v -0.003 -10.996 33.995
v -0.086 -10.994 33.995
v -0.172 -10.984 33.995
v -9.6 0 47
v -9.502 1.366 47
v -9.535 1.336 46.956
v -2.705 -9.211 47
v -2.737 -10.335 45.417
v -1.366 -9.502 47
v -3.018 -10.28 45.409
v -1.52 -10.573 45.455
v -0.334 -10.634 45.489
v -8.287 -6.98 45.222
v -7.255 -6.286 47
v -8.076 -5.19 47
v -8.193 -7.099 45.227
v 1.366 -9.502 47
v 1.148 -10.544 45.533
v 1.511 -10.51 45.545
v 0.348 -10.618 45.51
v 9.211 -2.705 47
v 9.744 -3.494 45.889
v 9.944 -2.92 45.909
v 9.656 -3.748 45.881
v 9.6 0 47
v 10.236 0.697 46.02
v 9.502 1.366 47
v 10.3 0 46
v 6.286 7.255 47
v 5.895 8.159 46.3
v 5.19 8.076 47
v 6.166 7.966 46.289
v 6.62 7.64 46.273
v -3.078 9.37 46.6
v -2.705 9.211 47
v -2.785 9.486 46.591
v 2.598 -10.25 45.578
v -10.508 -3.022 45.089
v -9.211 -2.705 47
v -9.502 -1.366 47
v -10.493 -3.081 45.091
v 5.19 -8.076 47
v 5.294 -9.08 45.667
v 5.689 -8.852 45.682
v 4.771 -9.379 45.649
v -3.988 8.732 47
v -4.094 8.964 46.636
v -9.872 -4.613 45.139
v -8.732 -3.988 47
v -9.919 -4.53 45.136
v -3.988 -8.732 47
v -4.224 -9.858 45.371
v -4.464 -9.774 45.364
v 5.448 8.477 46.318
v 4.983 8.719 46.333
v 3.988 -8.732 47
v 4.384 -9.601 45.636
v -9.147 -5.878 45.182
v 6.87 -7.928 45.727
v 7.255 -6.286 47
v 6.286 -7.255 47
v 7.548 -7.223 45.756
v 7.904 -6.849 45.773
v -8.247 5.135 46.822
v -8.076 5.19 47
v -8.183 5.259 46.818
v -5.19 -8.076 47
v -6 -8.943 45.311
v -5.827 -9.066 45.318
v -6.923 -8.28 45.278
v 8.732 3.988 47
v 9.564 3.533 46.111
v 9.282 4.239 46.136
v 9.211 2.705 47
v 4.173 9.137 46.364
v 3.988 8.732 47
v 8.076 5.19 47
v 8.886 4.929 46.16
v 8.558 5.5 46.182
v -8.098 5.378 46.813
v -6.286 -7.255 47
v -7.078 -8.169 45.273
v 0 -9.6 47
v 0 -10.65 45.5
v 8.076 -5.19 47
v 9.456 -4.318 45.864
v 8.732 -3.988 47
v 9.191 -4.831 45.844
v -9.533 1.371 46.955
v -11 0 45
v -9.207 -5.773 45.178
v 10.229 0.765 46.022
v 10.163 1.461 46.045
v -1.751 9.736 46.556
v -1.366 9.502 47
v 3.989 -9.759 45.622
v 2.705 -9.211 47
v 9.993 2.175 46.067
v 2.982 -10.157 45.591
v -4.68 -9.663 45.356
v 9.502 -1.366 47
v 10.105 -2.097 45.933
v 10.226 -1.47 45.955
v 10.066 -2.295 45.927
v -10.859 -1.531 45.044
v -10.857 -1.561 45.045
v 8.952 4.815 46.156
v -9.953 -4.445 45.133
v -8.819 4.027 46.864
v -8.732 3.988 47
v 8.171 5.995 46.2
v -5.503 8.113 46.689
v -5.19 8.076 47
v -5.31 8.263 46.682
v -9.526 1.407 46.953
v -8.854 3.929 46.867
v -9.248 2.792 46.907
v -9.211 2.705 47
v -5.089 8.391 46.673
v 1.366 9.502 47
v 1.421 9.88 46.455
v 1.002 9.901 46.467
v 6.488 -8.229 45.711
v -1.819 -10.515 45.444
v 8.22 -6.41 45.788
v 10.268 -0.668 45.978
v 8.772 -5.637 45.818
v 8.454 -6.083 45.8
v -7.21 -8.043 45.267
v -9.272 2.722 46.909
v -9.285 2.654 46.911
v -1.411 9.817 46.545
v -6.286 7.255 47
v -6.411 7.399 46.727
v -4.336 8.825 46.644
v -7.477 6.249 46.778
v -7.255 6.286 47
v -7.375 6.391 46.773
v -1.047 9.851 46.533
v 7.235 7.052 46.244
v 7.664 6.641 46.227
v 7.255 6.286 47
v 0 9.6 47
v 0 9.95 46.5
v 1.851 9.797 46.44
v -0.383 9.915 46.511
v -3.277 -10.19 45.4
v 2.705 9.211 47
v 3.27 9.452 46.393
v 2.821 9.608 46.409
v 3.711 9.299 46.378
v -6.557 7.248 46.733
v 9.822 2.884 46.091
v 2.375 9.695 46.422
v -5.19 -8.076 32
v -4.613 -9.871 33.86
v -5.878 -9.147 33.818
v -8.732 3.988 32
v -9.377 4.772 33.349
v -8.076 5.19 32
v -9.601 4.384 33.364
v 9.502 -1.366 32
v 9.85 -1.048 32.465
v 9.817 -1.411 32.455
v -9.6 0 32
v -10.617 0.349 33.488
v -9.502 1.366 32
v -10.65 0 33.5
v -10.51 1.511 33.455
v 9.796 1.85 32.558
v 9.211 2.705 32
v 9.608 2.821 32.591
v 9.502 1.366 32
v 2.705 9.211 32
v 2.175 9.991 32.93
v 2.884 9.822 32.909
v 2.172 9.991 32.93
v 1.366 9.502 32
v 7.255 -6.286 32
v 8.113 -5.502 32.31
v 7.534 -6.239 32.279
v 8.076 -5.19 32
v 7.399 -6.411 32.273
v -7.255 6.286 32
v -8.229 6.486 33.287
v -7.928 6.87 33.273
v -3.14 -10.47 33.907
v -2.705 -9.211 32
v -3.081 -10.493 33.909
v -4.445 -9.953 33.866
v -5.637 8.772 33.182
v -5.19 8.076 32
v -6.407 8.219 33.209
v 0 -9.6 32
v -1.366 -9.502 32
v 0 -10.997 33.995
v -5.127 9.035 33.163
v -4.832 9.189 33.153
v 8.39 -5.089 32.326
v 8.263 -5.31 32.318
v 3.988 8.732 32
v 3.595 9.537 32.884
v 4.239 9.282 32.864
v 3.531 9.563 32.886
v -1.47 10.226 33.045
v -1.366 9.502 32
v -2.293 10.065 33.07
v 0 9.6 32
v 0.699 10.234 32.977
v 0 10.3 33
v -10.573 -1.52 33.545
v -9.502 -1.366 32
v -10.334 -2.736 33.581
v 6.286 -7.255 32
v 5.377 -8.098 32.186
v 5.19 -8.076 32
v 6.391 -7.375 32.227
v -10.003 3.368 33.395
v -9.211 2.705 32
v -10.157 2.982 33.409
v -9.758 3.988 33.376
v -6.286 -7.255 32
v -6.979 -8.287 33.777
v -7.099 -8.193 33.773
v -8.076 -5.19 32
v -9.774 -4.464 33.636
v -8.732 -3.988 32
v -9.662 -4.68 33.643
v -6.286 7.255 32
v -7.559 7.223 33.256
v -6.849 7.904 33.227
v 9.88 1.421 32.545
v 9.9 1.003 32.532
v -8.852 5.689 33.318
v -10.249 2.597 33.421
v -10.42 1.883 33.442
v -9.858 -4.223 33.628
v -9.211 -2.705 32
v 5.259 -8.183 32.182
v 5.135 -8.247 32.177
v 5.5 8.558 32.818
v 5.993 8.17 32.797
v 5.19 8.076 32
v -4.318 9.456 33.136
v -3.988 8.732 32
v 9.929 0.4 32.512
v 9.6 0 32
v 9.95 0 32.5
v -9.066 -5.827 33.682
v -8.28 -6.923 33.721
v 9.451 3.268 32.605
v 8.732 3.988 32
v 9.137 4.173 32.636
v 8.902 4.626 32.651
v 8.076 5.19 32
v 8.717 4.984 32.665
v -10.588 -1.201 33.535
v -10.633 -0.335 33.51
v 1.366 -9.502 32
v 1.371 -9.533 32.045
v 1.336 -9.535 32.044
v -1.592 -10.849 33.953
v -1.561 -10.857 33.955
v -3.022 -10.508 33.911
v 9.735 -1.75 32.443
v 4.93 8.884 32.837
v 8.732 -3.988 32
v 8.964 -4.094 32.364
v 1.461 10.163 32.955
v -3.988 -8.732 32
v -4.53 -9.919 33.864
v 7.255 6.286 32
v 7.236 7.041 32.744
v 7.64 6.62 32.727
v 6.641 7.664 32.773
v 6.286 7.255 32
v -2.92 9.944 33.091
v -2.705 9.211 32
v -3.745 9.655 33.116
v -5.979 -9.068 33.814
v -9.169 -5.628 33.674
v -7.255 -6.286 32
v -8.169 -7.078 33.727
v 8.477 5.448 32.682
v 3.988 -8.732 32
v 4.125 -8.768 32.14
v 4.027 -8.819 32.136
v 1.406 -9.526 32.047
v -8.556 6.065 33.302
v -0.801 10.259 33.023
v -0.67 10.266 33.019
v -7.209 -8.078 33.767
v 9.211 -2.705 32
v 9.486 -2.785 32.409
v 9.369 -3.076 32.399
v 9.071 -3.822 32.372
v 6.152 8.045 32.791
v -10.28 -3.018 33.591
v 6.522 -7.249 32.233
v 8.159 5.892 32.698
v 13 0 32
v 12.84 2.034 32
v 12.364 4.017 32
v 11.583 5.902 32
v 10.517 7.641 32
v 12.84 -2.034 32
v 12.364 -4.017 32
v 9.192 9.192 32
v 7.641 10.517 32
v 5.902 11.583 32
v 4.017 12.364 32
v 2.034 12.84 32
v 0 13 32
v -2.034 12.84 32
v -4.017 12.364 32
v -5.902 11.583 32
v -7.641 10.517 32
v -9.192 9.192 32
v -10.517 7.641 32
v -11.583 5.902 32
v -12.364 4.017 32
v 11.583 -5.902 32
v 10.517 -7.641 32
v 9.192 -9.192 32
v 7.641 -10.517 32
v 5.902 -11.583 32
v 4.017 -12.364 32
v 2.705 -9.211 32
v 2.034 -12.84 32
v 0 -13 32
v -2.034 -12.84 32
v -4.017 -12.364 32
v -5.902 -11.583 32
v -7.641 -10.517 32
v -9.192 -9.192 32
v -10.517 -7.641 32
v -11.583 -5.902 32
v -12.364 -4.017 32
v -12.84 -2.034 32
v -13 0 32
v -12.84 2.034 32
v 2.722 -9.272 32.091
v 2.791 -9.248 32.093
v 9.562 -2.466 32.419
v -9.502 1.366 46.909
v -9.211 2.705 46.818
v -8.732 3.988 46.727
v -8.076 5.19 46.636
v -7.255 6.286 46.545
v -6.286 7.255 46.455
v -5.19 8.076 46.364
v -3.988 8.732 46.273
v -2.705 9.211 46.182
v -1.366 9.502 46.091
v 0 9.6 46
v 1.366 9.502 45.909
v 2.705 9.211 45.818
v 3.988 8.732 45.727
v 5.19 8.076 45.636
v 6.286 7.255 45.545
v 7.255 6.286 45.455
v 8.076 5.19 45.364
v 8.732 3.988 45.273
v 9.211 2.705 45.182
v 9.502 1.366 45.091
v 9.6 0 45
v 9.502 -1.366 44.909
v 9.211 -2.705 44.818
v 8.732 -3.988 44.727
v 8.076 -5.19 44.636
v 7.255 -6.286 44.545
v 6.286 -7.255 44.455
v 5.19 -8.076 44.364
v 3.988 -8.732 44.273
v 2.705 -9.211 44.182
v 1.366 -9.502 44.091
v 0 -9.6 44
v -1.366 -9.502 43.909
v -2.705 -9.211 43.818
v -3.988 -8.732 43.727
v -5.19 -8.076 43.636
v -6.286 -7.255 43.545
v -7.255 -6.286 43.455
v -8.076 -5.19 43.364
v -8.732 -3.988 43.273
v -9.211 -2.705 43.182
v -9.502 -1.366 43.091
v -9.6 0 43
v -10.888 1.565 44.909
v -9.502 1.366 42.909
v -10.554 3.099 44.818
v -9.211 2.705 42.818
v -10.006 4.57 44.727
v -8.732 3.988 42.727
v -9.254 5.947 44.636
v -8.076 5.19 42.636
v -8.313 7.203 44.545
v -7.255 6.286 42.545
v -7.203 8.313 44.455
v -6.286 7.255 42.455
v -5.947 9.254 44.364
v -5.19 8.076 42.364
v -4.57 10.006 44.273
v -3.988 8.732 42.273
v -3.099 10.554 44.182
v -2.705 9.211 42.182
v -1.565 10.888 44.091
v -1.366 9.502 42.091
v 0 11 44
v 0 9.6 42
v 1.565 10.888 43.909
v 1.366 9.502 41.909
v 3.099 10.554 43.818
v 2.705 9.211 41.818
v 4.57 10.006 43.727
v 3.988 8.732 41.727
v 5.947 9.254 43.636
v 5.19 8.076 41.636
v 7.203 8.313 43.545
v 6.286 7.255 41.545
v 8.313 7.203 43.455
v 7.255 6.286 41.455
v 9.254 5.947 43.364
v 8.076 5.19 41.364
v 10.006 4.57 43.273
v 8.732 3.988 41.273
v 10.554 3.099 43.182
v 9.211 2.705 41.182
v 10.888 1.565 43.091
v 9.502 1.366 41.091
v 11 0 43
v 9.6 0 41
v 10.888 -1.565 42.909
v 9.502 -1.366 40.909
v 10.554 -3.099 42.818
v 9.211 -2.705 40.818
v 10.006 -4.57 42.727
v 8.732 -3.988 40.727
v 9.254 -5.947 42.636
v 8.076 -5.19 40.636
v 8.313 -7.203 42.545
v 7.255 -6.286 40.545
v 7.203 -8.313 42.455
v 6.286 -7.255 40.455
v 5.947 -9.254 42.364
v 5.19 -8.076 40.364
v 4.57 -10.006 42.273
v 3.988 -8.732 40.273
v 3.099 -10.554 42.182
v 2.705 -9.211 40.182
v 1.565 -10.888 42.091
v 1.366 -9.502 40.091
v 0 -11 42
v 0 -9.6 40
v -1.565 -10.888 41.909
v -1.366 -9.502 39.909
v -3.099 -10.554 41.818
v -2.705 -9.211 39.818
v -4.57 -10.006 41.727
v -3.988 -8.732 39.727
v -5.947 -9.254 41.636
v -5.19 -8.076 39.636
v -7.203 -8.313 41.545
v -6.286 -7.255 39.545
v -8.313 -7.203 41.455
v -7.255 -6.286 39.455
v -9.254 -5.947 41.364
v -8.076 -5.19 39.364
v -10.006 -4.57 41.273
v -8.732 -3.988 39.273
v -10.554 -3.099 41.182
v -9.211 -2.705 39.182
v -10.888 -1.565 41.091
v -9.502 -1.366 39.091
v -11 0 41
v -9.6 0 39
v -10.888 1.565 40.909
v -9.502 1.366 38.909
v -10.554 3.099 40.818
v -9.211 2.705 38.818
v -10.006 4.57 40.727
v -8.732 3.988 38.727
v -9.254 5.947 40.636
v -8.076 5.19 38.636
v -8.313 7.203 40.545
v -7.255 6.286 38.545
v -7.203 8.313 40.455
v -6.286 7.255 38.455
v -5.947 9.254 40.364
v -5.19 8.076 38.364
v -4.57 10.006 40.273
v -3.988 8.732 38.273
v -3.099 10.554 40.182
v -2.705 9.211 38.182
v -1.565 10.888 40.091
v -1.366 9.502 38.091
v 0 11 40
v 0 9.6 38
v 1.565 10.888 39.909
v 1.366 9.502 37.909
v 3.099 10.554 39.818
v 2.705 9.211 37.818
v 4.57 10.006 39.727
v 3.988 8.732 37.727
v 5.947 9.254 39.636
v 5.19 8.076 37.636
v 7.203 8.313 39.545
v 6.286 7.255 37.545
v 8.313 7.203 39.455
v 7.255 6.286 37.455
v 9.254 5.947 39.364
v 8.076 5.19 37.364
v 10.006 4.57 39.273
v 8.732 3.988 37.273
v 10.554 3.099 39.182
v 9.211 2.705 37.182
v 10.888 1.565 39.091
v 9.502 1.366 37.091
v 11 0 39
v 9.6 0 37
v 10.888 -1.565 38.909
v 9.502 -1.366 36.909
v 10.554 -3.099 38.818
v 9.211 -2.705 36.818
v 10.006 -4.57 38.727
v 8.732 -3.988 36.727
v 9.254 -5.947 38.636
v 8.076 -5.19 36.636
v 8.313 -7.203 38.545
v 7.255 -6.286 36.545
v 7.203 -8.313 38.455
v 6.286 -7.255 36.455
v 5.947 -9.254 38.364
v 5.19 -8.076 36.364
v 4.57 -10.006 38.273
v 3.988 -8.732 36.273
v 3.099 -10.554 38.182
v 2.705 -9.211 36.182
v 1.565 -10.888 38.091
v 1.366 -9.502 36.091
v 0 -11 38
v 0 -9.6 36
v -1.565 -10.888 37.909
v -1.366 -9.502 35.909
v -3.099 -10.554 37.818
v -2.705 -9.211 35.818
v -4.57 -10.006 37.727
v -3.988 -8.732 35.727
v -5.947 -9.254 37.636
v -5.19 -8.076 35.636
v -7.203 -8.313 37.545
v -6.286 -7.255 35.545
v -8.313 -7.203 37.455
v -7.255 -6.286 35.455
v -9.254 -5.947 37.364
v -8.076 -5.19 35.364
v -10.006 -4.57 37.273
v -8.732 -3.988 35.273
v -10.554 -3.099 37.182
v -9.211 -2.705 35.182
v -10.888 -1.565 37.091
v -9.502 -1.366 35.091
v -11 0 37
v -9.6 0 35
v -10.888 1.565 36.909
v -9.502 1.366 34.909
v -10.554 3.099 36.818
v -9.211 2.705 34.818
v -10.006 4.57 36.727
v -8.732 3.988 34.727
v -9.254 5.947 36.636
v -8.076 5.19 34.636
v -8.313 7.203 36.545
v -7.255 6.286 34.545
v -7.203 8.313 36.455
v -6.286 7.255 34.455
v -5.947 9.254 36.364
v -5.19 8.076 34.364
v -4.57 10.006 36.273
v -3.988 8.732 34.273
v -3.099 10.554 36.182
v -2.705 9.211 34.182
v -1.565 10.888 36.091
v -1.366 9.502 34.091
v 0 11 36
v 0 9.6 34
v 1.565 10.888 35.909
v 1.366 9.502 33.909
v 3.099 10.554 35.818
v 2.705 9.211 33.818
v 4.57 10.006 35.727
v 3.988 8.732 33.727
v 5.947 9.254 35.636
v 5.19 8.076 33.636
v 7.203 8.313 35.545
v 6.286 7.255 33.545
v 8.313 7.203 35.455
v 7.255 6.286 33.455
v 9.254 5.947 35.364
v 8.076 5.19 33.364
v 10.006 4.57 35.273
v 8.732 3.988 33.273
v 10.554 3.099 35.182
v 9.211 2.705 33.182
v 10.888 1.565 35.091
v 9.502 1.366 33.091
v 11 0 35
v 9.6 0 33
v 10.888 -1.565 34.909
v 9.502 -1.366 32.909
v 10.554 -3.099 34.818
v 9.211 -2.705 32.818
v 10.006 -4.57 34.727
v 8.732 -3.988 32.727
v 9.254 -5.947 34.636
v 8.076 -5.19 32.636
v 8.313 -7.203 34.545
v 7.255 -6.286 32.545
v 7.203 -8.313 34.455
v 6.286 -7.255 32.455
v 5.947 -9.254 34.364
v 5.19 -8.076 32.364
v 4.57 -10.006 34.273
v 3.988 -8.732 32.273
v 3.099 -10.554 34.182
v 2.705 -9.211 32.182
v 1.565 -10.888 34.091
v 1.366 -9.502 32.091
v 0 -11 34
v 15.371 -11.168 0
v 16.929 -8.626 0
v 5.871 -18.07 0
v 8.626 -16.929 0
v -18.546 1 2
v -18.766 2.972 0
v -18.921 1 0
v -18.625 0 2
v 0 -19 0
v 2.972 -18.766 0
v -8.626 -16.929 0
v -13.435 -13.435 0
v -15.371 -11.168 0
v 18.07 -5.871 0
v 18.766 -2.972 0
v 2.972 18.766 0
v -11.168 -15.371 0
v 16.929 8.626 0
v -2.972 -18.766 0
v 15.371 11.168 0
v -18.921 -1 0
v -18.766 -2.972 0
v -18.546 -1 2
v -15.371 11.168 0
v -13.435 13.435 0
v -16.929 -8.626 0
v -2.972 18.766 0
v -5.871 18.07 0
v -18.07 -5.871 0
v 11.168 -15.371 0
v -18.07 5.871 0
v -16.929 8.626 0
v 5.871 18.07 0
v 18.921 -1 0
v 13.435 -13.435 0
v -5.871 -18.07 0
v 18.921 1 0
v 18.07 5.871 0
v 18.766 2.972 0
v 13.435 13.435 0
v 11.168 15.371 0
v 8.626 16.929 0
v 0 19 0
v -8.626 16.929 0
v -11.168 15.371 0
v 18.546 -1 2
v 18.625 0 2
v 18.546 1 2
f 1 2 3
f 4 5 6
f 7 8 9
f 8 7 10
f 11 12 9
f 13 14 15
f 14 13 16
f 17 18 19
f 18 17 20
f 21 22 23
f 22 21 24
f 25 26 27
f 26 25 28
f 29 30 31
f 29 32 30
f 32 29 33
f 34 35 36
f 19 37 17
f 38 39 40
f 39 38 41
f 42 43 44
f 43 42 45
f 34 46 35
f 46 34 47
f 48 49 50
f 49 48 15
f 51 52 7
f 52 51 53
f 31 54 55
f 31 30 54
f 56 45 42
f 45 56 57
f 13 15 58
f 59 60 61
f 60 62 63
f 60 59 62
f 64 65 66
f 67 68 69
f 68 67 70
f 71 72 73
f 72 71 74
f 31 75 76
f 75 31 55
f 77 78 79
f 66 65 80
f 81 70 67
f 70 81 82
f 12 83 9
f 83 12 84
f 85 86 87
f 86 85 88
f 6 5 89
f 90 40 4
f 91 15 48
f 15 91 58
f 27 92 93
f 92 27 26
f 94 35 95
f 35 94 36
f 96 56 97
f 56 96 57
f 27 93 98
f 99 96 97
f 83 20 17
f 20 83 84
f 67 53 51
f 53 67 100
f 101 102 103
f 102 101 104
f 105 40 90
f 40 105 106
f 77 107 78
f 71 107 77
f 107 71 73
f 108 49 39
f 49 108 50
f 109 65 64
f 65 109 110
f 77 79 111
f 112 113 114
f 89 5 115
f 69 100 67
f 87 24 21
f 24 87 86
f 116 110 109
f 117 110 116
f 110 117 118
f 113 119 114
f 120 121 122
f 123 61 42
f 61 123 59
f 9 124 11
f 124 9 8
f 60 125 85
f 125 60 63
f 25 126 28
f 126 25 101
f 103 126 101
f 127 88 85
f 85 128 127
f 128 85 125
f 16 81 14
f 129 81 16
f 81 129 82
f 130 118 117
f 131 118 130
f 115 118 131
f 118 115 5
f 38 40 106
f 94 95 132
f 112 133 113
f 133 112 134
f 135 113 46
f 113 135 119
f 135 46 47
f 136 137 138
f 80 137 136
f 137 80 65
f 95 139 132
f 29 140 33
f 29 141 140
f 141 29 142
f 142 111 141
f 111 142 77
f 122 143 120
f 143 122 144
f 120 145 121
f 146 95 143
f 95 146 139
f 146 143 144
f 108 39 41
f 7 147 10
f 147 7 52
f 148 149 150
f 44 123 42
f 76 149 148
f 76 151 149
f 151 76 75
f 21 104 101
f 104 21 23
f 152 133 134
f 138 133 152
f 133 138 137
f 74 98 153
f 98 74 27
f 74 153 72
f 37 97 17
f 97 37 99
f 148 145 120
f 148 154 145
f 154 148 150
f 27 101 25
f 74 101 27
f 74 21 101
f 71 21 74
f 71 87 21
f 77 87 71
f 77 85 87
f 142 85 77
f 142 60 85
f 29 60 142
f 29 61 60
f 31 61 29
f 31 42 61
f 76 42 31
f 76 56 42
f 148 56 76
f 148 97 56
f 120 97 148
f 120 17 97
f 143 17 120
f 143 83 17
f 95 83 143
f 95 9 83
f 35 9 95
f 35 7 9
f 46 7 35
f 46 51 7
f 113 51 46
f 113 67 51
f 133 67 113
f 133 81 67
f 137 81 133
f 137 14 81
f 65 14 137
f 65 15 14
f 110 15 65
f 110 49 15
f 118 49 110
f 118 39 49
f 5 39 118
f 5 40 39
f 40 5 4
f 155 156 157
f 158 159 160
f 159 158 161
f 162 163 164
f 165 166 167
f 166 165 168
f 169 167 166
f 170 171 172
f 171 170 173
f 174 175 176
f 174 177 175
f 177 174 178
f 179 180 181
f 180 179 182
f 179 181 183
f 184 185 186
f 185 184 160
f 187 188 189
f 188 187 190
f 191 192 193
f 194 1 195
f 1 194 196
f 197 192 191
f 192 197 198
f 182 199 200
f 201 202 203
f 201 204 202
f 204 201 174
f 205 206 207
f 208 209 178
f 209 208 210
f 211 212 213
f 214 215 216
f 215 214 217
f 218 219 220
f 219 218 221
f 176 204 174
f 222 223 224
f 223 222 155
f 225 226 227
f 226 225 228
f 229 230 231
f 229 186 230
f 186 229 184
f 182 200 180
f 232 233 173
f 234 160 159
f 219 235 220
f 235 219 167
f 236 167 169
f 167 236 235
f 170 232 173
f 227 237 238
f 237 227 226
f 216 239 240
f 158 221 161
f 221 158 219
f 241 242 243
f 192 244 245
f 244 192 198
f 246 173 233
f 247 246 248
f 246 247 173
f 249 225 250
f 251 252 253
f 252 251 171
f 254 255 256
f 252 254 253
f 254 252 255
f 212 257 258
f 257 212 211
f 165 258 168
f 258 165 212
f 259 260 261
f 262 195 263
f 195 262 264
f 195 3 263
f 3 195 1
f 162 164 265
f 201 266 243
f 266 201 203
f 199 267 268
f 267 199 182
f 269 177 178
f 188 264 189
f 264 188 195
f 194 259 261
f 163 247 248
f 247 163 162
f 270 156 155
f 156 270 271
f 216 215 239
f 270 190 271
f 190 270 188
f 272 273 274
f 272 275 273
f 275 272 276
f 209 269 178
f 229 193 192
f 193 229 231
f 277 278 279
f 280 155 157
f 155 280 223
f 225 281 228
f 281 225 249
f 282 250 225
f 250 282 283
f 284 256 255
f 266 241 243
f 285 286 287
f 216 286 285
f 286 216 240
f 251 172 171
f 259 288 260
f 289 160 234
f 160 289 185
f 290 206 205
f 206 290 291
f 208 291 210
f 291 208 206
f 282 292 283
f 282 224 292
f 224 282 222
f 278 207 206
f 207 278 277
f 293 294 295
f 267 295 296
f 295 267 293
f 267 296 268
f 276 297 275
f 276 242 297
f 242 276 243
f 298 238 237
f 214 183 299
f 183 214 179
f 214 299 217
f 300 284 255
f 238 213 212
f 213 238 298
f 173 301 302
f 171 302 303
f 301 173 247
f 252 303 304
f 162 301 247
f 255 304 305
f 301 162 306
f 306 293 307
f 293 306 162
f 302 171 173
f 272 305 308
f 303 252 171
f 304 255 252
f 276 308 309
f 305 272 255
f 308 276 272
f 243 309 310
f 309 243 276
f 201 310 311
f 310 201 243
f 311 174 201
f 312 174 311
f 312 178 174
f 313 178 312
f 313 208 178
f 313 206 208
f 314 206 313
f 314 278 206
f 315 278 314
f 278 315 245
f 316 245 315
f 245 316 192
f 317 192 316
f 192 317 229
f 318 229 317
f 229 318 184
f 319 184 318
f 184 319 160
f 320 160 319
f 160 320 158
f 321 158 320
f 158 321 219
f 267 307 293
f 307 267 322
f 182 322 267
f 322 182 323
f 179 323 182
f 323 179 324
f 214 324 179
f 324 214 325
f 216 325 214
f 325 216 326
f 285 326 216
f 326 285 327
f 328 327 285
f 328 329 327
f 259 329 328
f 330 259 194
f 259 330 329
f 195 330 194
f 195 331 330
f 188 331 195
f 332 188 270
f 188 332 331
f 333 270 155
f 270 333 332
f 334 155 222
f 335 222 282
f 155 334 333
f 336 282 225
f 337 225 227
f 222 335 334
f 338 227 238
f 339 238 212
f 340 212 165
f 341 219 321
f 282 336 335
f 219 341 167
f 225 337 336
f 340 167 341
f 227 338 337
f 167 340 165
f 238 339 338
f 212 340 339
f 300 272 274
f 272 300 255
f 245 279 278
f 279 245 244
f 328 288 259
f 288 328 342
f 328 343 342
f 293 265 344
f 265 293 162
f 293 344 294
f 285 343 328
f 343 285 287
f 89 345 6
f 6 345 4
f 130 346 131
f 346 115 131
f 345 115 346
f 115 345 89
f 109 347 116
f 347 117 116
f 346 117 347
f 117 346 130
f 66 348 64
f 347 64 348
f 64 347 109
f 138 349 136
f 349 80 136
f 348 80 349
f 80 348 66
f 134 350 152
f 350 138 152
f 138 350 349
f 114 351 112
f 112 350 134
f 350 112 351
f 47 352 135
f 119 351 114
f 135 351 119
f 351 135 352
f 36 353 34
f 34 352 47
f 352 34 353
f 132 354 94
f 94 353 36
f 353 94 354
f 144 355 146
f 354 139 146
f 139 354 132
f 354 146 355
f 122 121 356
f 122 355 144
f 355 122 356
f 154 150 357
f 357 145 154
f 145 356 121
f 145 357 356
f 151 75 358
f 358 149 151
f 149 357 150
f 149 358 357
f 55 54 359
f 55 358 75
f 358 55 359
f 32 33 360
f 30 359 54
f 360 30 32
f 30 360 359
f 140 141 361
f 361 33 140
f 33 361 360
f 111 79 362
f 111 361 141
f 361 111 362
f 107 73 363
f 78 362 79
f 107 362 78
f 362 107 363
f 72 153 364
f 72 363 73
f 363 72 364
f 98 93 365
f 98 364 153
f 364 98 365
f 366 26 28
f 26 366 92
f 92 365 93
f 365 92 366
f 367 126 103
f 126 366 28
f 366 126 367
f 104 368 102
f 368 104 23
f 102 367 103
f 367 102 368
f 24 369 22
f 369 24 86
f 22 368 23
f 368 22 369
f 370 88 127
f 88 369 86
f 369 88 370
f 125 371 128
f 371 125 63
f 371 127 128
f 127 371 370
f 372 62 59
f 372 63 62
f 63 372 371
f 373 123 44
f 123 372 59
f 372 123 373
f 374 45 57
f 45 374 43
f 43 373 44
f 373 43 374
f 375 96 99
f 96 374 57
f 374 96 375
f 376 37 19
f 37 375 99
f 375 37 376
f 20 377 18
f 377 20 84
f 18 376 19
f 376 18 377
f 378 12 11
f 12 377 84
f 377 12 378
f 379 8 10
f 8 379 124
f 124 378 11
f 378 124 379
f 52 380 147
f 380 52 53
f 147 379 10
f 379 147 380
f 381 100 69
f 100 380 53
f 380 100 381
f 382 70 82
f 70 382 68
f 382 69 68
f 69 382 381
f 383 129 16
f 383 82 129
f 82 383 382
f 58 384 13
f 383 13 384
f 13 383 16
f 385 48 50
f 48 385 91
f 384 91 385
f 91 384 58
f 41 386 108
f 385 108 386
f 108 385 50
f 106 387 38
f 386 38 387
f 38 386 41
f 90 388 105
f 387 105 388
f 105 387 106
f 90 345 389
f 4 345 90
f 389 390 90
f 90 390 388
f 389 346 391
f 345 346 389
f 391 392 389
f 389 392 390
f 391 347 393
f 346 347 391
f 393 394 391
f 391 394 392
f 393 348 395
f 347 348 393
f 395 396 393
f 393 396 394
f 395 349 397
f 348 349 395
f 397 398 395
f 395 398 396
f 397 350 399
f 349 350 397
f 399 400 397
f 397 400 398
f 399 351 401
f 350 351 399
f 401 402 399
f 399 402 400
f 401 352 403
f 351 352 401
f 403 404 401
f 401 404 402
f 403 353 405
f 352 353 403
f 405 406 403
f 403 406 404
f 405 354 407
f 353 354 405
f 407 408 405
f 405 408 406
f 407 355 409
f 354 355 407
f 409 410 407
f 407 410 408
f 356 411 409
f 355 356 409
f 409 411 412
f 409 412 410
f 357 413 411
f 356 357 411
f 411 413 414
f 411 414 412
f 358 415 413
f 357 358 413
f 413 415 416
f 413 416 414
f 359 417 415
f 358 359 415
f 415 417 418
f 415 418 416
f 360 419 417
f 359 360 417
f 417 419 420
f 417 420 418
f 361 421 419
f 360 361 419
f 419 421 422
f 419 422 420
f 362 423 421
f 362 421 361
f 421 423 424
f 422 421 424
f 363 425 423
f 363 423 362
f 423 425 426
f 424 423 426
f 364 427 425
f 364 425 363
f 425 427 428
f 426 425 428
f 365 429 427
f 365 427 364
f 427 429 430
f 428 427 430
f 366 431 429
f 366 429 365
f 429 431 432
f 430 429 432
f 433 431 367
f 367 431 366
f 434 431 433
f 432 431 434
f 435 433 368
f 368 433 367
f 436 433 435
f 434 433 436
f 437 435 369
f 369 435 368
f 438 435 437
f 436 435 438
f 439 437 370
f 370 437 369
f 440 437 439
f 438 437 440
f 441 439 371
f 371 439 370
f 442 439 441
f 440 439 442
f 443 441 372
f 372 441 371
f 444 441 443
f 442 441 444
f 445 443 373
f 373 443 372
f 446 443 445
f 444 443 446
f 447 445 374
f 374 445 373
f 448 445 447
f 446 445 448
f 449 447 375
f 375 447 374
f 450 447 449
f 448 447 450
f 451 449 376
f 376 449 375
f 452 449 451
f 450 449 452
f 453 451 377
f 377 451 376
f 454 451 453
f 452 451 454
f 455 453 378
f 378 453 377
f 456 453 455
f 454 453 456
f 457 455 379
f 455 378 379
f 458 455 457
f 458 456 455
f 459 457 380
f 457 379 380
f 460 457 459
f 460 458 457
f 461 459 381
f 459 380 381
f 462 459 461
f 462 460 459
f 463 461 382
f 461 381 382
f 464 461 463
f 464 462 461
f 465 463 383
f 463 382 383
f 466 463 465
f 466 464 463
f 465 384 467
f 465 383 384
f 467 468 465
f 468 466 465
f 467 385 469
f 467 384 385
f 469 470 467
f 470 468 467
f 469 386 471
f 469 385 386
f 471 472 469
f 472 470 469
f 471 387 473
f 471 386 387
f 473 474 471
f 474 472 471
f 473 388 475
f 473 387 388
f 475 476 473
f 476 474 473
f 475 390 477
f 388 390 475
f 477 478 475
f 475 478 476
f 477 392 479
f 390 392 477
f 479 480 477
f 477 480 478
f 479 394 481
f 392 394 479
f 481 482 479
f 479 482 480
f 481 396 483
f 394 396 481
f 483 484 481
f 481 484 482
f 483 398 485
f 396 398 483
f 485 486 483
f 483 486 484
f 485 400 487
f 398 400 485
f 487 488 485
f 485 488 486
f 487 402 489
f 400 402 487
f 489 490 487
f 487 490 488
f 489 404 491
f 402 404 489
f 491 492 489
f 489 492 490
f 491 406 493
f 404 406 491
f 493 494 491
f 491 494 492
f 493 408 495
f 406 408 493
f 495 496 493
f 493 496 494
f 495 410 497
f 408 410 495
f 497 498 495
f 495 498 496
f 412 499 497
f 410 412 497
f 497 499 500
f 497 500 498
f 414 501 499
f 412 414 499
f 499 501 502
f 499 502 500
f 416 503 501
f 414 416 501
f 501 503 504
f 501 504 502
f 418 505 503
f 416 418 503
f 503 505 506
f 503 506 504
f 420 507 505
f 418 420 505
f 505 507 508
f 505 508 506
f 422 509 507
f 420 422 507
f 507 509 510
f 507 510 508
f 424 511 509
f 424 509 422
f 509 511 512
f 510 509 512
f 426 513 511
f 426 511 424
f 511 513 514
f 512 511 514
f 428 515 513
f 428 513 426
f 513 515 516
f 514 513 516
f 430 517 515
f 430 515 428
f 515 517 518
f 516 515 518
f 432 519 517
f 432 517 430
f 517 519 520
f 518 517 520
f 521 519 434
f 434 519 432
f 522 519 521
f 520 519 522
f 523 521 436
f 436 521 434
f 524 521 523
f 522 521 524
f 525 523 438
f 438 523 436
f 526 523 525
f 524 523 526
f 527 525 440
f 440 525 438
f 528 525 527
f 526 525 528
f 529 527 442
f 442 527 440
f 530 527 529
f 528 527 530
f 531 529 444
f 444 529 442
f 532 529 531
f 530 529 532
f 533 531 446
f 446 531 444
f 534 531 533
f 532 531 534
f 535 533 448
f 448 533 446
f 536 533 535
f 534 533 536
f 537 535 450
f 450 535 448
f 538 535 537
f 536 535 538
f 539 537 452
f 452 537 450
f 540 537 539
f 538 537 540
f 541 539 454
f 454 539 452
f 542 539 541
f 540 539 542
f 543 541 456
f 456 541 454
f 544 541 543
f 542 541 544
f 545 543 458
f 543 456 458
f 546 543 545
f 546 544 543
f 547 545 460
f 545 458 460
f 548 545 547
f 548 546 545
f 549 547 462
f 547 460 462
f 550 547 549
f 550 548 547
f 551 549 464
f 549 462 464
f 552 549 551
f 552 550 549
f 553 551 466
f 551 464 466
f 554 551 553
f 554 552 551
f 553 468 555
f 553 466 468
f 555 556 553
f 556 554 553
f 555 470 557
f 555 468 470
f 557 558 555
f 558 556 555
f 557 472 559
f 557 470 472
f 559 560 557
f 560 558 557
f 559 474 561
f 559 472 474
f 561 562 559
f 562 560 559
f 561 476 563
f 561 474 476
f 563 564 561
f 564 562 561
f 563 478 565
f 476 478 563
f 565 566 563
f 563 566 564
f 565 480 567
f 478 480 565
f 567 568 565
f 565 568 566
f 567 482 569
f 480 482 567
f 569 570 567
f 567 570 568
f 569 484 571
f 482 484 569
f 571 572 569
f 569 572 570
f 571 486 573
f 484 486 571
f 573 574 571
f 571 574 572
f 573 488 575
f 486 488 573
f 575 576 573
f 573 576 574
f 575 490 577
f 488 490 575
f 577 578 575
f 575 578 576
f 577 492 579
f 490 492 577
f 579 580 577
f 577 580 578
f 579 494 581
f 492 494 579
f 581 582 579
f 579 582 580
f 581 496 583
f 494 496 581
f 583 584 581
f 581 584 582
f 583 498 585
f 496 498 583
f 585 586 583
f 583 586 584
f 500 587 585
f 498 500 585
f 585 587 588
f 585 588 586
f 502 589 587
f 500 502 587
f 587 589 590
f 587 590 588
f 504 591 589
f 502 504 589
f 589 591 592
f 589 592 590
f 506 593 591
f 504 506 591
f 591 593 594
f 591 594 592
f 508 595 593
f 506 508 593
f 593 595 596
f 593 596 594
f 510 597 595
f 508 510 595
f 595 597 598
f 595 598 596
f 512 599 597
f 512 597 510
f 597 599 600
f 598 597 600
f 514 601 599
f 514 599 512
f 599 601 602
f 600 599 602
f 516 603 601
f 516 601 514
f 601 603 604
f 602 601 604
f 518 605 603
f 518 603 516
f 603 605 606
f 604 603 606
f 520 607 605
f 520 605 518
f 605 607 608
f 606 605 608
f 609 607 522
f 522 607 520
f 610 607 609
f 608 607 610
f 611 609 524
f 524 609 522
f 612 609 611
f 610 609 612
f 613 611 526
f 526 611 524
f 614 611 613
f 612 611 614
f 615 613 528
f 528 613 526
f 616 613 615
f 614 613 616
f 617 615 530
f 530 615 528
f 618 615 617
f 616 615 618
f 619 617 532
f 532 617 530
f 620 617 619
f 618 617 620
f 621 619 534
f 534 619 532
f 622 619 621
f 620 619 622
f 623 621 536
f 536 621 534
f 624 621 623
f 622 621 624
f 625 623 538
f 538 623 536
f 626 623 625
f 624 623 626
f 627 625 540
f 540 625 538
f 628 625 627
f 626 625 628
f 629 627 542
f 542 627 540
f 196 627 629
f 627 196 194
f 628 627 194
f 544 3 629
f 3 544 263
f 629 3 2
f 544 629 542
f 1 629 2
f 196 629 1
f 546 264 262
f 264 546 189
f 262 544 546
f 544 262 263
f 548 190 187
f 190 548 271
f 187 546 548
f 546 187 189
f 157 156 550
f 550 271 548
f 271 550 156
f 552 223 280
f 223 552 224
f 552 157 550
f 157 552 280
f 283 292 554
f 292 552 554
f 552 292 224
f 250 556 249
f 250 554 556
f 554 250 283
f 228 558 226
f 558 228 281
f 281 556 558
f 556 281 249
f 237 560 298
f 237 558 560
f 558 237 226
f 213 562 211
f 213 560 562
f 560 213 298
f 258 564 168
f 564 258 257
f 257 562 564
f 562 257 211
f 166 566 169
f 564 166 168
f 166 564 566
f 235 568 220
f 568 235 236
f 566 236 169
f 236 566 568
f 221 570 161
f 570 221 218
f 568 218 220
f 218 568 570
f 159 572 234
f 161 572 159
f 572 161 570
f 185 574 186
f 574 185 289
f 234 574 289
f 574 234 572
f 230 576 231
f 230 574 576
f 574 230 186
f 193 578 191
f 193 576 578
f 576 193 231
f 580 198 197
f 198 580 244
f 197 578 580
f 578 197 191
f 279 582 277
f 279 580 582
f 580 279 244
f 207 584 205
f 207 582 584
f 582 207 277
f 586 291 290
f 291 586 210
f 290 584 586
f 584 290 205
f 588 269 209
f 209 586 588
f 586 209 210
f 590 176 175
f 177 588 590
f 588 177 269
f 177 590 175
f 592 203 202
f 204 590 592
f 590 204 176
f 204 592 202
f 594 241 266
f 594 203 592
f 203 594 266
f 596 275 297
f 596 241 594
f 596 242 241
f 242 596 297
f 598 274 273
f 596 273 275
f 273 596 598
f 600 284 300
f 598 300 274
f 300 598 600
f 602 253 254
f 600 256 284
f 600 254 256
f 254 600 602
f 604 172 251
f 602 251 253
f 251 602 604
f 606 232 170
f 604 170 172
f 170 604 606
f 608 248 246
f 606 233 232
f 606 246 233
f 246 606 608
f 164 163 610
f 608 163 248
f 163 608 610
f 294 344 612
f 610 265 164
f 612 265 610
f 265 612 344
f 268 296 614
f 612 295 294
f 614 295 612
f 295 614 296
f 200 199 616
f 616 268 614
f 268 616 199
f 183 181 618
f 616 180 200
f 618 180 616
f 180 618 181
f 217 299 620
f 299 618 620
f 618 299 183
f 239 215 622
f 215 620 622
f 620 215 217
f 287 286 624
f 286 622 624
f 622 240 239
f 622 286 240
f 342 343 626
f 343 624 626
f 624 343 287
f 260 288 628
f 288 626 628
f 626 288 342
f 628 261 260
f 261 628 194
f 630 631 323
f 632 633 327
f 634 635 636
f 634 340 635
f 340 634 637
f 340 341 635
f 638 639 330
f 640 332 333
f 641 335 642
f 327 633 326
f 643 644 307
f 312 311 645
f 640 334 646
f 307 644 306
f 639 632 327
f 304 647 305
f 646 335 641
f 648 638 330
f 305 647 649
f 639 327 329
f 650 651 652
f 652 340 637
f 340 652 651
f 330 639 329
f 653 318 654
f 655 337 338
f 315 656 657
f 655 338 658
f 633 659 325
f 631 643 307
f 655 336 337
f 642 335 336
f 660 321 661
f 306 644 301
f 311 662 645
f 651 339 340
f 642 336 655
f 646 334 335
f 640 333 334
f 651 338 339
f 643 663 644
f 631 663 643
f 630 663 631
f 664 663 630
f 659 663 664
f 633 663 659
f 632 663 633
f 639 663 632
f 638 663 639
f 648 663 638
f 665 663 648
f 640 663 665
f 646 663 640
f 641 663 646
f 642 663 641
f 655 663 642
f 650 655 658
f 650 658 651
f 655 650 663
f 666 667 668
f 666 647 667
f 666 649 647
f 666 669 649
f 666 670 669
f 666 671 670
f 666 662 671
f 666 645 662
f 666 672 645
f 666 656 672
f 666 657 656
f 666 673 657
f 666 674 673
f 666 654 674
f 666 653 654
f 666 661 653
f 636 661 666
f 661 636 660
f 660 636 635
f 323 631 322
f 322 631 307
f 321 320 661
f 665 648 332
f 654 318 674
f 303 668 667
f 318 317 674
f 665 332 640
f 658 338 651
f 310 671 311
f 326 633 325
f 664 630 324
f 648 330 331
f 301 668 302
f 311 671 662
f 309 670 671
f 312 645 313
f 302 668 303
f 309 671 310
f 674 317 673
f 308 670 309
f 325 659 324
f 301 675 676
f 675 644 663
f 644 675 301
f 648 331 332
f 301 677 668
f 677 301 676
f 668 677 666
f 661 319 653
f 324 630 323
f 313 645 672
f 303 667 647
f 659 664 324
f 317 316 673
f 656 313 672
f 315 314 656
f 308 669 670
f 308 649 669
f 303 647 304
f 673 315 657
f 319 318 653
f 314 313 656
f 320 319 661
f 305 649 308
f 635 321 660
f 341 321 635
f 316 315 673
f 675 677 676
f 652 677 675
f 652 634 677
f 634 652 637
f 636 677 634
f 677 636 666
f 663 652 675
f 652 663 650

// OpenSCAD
//////////////////////////////////////////////////////////////////////
// Project: Custom Threaded scupper plugs for Pelican kayak         //
// Purpose: Stop me from getting a wet butt.                        //
// Add attachements in the future.                                  //
// Author: infinigrove Squirrel Master                              //
// Date: 23 December 2015    v1.3                                   //
//////////////////////////////////////////////////////////////////////

// Printing:
// Set to 10% to 20% infill with minimal material so they float!

// ---------------------------------------------------------------- //
// ------------------ BEGIN USER SERVICABLE CODE ------------------ //
// ---------------------------------------------------------------- //

//   !!!! NOTE: DIMENSIONS ARE METRIC AND IN MILIMETERS !!!!   //

// Length of scupper plug
plug_length = 32;

plug_detail = 40; //[40:360]

thread_detail = 2; //[2:8]

// Diameter of the top of plug
top_diameter = 26;

top_style = "bolt"; //[bolt,nut,hook,flat,pole_holder]

top_base_bevel = "no"; //[yes,no]

top_thread_length = 15;
top_thread_diameter = 22;
top_thread_pitch = 4; //[2:6]

// Diameter of bottom of plug
bottom_diameter = 38;

// Which end would you like? (bottom)
bottom_style = "slot"; //[slot,bolt,nut,hook,gopro,flat,scoop]

bottom_base_bevel = "no"; //[yes,no]

/* [bottom slot] */

slot_size = 2; // [1:10]

/* [bottom bolt nut] */

bottom_thread_length = 47;
bottom_thread_diameter = 18;
bottom_thread_pitch = 4; //[2:6]

/* [Top Pole Holder EXPERIMENTAL] */

pole_holder_length = 115;
pole_holder_outer_diameter = 40;
pole_holder_inner_diameter = 28;
pole_holder_base_diameter = 80;

/* [GoPro Connector EXPERIMENTAL] */

gopro_style="triple_nut"; // [triple_nut,triple,double]
gopro_base_height = 48;


/* [Hidden] */

// The gopro connector itself (you most probably do not want to change this but for the first two)

// The locking nut on the gopro mount triple arm mount (keep it tight)
gopro_nut_d= 9.2;
// How deep is this nut embossing (keep it small to avoid over-overhangs)
gopro_nut_h= 2;
// Hole diameter for the two-arm mount part
gopro_holed_two= 5;
// Hole diameter for the three-arm mount part
gopro_holed_three= 5.5;
// Thickness of the internal arm in the 3-arm mount part
gopro_connector_th3_middle= 3.1;
// Thickness of the side arms in the 3-arm mount part
gopro_connector_th3_side= 2.7;
// Thickness of the arms in the 2-arm mount part
gopro_connector_th2= 3.04;
// The gap in the 3-arm mount part for the two-arm
gopro_connector_gap= 3.1;
// How round are the 2 and 3-arm parts
gopro_connector_roundness= 1;
// How thick are the mount walls
gopro_wall_th= 3;

gopro_connector_wall_tol=1.1+0;
gopro_tol=0.04+0;

// Can be queried from the outside
gopro_connector_z= 2*gopro_connector_th3_side+gopro_connector_th3_middle+2*gopro_connector_gap;
gopro_connector_x= gopro_connector_z;
gopro_connector_y= gopro_connector_z/2+gopro_wall_th;
// ---------------------------------------------------------------- //
// ------------------- END USER SERVICABLE CODE ------------------- //
module plug_torus(r,rnd)
{
	translate([0,0,rnd/2])
		rotate_extrude(convexity= 10, $fn=plug_detail)
			translate([r-rnd/2, 0, 0])
				circle(r= rnd/2, $fs=0.2);
}
// ---------------------------------------------------------------- //
// --- screw thread modules --------------------------------------- //
/*    Minimal thread modules hacked from
 *    polyScrewThread.scad    by aubenc @ Thingiverse
 *
 * This script contains the library modules that can be used to 
 * generate screw and nut threads.
 *
 * http://www.thingiverse.com/thing:8796
 *
 * CC Public Domain
 */
// --- modules added for use with thingverse cusomizer ------------ //
// ---------------------------------------------------------------- //
module screw_thread(od,st,lf0,lt,rs,cs)
{
    or=od/2;
    ir=or-st/2*cos(lf0)/sin(lf0);
    pf=2*PI*or;
    sn=floor(pf/rs);
    lfxy=360/sn;
    ttn=round(lt/st)+1;
    zt=st/sn;

    intersection()
    {
        if (cs >= -1)
        {
           # thread_shape(cs,lt,or,ir,sn,st);
        }

        full_thread(ttn,st,sn,zt,lfxy,or,ir);
    }
}

module thread_shape(cs,lt,or,ir,sn,st)
{
    if ( cs == 0 )
    {
        cylinder(h=lt, r=or, $fn=sn, center=false);
    }
    else
    {
        union()
        {
            translate([0,0,st/2])
              cylinder(h=lt-st+0.005, r=or, $fn=sn, center=false);

            if ( cs == -1 || cs == 2 )
            {
                cylinder(h=st/2, r1=ir, r2=or, $fn=sn, center=false);
            }
            else
            {
                cylinder(h=st/2, r=or, $fn=sn, center=false);
            }

            translate([0,0,lt-st/2])
            if ( cs == 1 || cs == 2 )
            {
                  cylinder(h=st/2, r1=or, r2=ir, $fn=sn, center=false);
            }
            else
            {
                cylinder(h=st/2, r=or, $fn=sn, center=false);
            }
        }
    }
}

module full_thread(ttn,st,sn,zt,lfxy,or,ir)
{
    for(i=[0:ttn-1])
    {
        for(j=[0:sn-1])
        {
            polyhedron(
                  points=[
                          [0,                  0,                  i*st-st            ],
                          [ir*cos((j+1)*lfxy), ir*sin((j+1)*lfxy), i*st+(j+1)*zt-st   ],
                          [ir*cos(j*lfxy),     ir*sin(j*lfxy),     i*st+j*zt-st       ],
                          [or*cos((j+1)*lfxy), or*sin((j+1)*lfxy), i*st+(j+1)*zt-st/2 ],
                          [or*cos(j*lfxy),     or*sin(j*lfxy),     i*st+j*zt-st/2     ],
                          [0,                  0,                  i*st+st            ],
                          [ir*cos((j+1)*lfxy), ir*sin((j+1)*lfxy), i*st+(j+1)*zt      ],
                          [ir*cos(j*lfxy),     ir*sin(j*lfxy),     i*st+j*zt          ]
                         ],
               triangles=[
                          [0,1,2],
                          [5,6,3],[5,3,0],[0,3,1],
                          [3,4,1],[1,4,2],
                          [3,6,4],[4,6,7],
                          [0,2,4],[0,4,5],[5,4,7],
                          [5,7,6]
                         ],
               convexity=5);
        }
    }
}
//GoPro connector module hacked from
// gopro_mounts_mooncactus.scad by MoonCactus
// http://www.thingiverse.com/thing:62800
module gopro_torus(r,rnd)
{
	translate([0,0,rnd/2])
		rotate_extrude(convexity= 10, $fn=plug_detail/2)
			translate([r-rnd/2, 0, 0])
				circle(r= rnd/2, $fs=0.2);
}


module gopro_connector(version="double", withnut=true, captive_nut_th=0, captive_nut_od=0, captive_rod_id=0, captive_nut_angle=0)
{
	module gopro_profile(th)
	{
		hull()
		{
			gopro_torus(r=gopro_connector_z/2, rnd=gopro_connector_roundness);
			translate([0,0,th-gopro_connector_roundness])
				gopro_torus(r=gopro_connector_z/2, rnd=gopro_connector_roundness);
			translate([-gopro_connector_z/2,gopro_connector_z/2,0])
				cube([gopro_connector_z,gopro_wall_th,th]);
		}
	}
	difference()
	{
		union()
		{
			if(version=="double")
			{
				for(mz=[-1:2:+1]) scale([1,1,mz])
						translate([0,0,gopro_connector_th3_middle/2 + (gopro_connector_gap-gopro_connector_th2)/2]) gopro_profile(gopro_connector_th2);
			}
			if(version=="triple")
			{
				translate([0,0,-gopro_connector_th3_middle/2]) gopro_profile(gopro_connector_th3_middle);
				for(mz=[-1:2:+1]) scale([1,1,mz])
					translate([0,0,gopro_connector_th3_middle/2 + gopro_connector_gap]) gopro_profile(gopro_connector_th3_side);
			}

			// add the common wall
			//translate([0,gopro_connector_z/2+gopro_wall_th/2+gopro_connector_wall_tol,0])
				//cube([gopro_connector_z,gopro_wall_th,gopro_connector_z], center=true);
            translate([0,(gopro_connector_z/2+gopro_wall_th/2+gopro_connector_wall_tol)+gopro_base_height,0]) rotate([90,0,0]) cylinder(h=gopro_base_height,d1=bottom_diameter,d2=gopro_connector_z*1.5,$fn=plug_detail);

			// add the optional nut emboss
			if(version=="triple" && withnut)
			{
				translate([0,0,gopro_connector_z/2-gopro_tol])
				difference()
				{
					cylinder(r1=gopro_connector_z/2-gopro_connector_roundness/2, r2=11.5/2, h=gopro_nut_h+gopro_tol, $fn=plug_detail /2);
					cylinder(r=gopro_nut_d/2, h=gopro_connector_z/2+3.5+gopro_tol, $fn=6);
				}
			}
		}
		// remove the axis
		translate([0,0,-gopro_tol])
			cylinder(r=(version=="double" ? gopro_holed_two : gopro_holed_three)/2, h=gopro_connector_z+4*gopro_tol, center=true, $fn=plug_detail /2);
	}
}

// ---------------------------------------------------------------- //
// --- render a custom threaded scupper plug ---------------------- //
// ---             MAIN CODE                 ---------------------- //
// ---------------------------------------------------------------- //
/*    Partially hacked and major additions from
 *    Glide_Kayak_Scuppers_-_Mahi_rev2.scad    by Max Bainrot 
 *
 * http://www.thingiverse.com/thing:951903
 *
 */
// ---------------------------------------------------------------- //
// ------- can be thanked for hook scupper end -------------------- //
// ---------------------------------------------------------------- //
PI=3.141592;
translate([0,0,plug_length])
rotate([0,180,0])
difference()
{
    union()
    {
        cylinder(h=(plug_length), r1=(top_diameter/2), r2=(bottom_diameter /2),$fn=plug_detail);
        
        // GoPro connector
        if (bottom_style == "gopro") 
        {
            if (gopro_style == "double") translate([0,0,plug_length+10+gopro_base_height])  rotate([270,0,0]) gopro_connector("double");
            if (gopro_style == "triple") translate([0,0,plug_length+10+gopro_base_height])  rotate([270,0,0]) gopro_connector("triple", withnut=false);
            if (gopro_style == "triple_nut") translate([0,0,plug_length+10+gopro_base_height])  rotate([270,0,0]) gopro_connector("triple", withnut=true);
        }  
        // scoop connector
        if (bottom_style == "scoop") translate([0,0,plug_length]) sphere(d=bottom_diameter, $fn=plug_detail);;
        
        // pole holder base
        if (top_style == "pole_holder") translate([0,0,-(pole_holder_outer_diameter /3)]) cylinder( h=pole_holder_outer_diameter /3,   d1=pole_holder_outer_diameter,    d2=pole_holder_base_diameter, $fn=plug_detail);
        
        if (top_style == "bolt") translate([0,0,-(top_thread_length)]) screw_thread(top_thread_diameter,top_thread_pitch,55,top_thread_length,PI/thread_detail,2);
            
        if (bottom_style == "bolt") translate([0,0,plug_length]) screw_thread(bottom_thread_diameter,bottom_thread_pitch,55,bottom_thread_length,PI/thread_detail,2);
            
        if (top_style == "hook") translate([0,(top_diameter /8),0]) rotate([90,0,0]) cylinder(d=top_diameter - 3,h=top_diameter /4,$fn=plug_detail);
        
        if (bottom_style == "hook") translate([0,(bottom_diameter /8),plug_length]) rotate([90,0,0]) cylinder(d=bottom_diameter - 3,h=bottom_diameter /4,$fn=plug_detail);
            
        if (bottom_base_bevel == "yes") translate([0,0,plug_length-(gopro_connector_roundness/1.4)]) plug_torus(r=bottom_diameter/2, rnd=gopro_connector_roundness);
            
        if (top_base_bevel == "yes") translate([0,0,-(gopro_connector_roundness/1.4)]) plug_torus(r=top_diameter/2, rnd=gopro_connector_roundness);
            
    }
    if (top_style == "hook") translate([0,0,0]) sphere(d=top_diameter /1.5, $fn=plug_detail);
        
    if (bottom_style == "hook") translate([0,0,plug_length]) sphere(d=bottom_diameter /1.5, $fn=plug_detail);
    
    if (top_style == "nut") screw_thread(top_thread_diameter,top_thread_pitch,55,top_thread_length,PI/thread_detail,0);
        
    if (bottom_style == "nut") translate([0,0,(plug_length - bottom_thread_length)]) screw_thread(bottom_thread_diameter,bottom_thread_pitch,55,bottom_thread_length,PI/thread_detail,0);
    
    if (bottom_style == "slot") translate([-(bottom_diameter /2),-(slot_size /2),(plug_length - slot_size)]) cube([bottom_diameter,slot_size,slot_size+gopro_connector_roundness]);
        
    
        
    if (bottom_style == "scoop") translate([0,0,plug_length]) 
    {
        //remove half with block and scoop out whats left
        translate([-(bottom_diameter /2), 0, 0])cube([bottom_diameter,bottom_diameter,bottom_diameter]);
        sphere(d=bottom_diameter - 4, $fn=plug_detail);
        //remove cylinder in plug
        translate([0,0,-plug_length]) cylinder(h=plug_length, d1=(top_diameter - 4), d2=(bottom_diameter - 4), $fn=plug_detail);
        
        //remove cylinder in top_bolt
        translate([0,0,-(plug_length + top_thread_length)]) cylinder(h=top_thread_length, d1=(top_thread_diameter - top_thread_pitch), d2=(top_thread_diameter - top_thread_pitch), $fn=plug_detail);
        
        //translate([0,0,-(plug_length + top_thread_length)]) cylinder(h=(plug_length + top_thread_length), d1=(bottom_thread_diameter - bottom_thread_pitch), d2=(bottom_diameter - 4), $fn=plug_detail);
        
    }
}

// pole holder main cylinder
if (top_style == "pole_holder") 
{
    // you may need to tweek this traslate depending on size of pole holder
    translate([(pole_holder_outer_diameter/1.1),0,(plug_length + pole_holder_length)*.98]) 
    rotate([0,200,0])
    difference()
    {
        union()
        {
            // pole holder outer
            cylinder(h=pole_holder_length, d=pole_holder_outer_diameter,$fn=plug_detail);
    
        }
        
        // pole holder inner
        cylinder(h=(pole_holder_length - (pole_holder_outer_diameter - pole_holder_inner_diameter)), d=pole_holder_inner_diameter,$fn=plug_detail);
    }
}
